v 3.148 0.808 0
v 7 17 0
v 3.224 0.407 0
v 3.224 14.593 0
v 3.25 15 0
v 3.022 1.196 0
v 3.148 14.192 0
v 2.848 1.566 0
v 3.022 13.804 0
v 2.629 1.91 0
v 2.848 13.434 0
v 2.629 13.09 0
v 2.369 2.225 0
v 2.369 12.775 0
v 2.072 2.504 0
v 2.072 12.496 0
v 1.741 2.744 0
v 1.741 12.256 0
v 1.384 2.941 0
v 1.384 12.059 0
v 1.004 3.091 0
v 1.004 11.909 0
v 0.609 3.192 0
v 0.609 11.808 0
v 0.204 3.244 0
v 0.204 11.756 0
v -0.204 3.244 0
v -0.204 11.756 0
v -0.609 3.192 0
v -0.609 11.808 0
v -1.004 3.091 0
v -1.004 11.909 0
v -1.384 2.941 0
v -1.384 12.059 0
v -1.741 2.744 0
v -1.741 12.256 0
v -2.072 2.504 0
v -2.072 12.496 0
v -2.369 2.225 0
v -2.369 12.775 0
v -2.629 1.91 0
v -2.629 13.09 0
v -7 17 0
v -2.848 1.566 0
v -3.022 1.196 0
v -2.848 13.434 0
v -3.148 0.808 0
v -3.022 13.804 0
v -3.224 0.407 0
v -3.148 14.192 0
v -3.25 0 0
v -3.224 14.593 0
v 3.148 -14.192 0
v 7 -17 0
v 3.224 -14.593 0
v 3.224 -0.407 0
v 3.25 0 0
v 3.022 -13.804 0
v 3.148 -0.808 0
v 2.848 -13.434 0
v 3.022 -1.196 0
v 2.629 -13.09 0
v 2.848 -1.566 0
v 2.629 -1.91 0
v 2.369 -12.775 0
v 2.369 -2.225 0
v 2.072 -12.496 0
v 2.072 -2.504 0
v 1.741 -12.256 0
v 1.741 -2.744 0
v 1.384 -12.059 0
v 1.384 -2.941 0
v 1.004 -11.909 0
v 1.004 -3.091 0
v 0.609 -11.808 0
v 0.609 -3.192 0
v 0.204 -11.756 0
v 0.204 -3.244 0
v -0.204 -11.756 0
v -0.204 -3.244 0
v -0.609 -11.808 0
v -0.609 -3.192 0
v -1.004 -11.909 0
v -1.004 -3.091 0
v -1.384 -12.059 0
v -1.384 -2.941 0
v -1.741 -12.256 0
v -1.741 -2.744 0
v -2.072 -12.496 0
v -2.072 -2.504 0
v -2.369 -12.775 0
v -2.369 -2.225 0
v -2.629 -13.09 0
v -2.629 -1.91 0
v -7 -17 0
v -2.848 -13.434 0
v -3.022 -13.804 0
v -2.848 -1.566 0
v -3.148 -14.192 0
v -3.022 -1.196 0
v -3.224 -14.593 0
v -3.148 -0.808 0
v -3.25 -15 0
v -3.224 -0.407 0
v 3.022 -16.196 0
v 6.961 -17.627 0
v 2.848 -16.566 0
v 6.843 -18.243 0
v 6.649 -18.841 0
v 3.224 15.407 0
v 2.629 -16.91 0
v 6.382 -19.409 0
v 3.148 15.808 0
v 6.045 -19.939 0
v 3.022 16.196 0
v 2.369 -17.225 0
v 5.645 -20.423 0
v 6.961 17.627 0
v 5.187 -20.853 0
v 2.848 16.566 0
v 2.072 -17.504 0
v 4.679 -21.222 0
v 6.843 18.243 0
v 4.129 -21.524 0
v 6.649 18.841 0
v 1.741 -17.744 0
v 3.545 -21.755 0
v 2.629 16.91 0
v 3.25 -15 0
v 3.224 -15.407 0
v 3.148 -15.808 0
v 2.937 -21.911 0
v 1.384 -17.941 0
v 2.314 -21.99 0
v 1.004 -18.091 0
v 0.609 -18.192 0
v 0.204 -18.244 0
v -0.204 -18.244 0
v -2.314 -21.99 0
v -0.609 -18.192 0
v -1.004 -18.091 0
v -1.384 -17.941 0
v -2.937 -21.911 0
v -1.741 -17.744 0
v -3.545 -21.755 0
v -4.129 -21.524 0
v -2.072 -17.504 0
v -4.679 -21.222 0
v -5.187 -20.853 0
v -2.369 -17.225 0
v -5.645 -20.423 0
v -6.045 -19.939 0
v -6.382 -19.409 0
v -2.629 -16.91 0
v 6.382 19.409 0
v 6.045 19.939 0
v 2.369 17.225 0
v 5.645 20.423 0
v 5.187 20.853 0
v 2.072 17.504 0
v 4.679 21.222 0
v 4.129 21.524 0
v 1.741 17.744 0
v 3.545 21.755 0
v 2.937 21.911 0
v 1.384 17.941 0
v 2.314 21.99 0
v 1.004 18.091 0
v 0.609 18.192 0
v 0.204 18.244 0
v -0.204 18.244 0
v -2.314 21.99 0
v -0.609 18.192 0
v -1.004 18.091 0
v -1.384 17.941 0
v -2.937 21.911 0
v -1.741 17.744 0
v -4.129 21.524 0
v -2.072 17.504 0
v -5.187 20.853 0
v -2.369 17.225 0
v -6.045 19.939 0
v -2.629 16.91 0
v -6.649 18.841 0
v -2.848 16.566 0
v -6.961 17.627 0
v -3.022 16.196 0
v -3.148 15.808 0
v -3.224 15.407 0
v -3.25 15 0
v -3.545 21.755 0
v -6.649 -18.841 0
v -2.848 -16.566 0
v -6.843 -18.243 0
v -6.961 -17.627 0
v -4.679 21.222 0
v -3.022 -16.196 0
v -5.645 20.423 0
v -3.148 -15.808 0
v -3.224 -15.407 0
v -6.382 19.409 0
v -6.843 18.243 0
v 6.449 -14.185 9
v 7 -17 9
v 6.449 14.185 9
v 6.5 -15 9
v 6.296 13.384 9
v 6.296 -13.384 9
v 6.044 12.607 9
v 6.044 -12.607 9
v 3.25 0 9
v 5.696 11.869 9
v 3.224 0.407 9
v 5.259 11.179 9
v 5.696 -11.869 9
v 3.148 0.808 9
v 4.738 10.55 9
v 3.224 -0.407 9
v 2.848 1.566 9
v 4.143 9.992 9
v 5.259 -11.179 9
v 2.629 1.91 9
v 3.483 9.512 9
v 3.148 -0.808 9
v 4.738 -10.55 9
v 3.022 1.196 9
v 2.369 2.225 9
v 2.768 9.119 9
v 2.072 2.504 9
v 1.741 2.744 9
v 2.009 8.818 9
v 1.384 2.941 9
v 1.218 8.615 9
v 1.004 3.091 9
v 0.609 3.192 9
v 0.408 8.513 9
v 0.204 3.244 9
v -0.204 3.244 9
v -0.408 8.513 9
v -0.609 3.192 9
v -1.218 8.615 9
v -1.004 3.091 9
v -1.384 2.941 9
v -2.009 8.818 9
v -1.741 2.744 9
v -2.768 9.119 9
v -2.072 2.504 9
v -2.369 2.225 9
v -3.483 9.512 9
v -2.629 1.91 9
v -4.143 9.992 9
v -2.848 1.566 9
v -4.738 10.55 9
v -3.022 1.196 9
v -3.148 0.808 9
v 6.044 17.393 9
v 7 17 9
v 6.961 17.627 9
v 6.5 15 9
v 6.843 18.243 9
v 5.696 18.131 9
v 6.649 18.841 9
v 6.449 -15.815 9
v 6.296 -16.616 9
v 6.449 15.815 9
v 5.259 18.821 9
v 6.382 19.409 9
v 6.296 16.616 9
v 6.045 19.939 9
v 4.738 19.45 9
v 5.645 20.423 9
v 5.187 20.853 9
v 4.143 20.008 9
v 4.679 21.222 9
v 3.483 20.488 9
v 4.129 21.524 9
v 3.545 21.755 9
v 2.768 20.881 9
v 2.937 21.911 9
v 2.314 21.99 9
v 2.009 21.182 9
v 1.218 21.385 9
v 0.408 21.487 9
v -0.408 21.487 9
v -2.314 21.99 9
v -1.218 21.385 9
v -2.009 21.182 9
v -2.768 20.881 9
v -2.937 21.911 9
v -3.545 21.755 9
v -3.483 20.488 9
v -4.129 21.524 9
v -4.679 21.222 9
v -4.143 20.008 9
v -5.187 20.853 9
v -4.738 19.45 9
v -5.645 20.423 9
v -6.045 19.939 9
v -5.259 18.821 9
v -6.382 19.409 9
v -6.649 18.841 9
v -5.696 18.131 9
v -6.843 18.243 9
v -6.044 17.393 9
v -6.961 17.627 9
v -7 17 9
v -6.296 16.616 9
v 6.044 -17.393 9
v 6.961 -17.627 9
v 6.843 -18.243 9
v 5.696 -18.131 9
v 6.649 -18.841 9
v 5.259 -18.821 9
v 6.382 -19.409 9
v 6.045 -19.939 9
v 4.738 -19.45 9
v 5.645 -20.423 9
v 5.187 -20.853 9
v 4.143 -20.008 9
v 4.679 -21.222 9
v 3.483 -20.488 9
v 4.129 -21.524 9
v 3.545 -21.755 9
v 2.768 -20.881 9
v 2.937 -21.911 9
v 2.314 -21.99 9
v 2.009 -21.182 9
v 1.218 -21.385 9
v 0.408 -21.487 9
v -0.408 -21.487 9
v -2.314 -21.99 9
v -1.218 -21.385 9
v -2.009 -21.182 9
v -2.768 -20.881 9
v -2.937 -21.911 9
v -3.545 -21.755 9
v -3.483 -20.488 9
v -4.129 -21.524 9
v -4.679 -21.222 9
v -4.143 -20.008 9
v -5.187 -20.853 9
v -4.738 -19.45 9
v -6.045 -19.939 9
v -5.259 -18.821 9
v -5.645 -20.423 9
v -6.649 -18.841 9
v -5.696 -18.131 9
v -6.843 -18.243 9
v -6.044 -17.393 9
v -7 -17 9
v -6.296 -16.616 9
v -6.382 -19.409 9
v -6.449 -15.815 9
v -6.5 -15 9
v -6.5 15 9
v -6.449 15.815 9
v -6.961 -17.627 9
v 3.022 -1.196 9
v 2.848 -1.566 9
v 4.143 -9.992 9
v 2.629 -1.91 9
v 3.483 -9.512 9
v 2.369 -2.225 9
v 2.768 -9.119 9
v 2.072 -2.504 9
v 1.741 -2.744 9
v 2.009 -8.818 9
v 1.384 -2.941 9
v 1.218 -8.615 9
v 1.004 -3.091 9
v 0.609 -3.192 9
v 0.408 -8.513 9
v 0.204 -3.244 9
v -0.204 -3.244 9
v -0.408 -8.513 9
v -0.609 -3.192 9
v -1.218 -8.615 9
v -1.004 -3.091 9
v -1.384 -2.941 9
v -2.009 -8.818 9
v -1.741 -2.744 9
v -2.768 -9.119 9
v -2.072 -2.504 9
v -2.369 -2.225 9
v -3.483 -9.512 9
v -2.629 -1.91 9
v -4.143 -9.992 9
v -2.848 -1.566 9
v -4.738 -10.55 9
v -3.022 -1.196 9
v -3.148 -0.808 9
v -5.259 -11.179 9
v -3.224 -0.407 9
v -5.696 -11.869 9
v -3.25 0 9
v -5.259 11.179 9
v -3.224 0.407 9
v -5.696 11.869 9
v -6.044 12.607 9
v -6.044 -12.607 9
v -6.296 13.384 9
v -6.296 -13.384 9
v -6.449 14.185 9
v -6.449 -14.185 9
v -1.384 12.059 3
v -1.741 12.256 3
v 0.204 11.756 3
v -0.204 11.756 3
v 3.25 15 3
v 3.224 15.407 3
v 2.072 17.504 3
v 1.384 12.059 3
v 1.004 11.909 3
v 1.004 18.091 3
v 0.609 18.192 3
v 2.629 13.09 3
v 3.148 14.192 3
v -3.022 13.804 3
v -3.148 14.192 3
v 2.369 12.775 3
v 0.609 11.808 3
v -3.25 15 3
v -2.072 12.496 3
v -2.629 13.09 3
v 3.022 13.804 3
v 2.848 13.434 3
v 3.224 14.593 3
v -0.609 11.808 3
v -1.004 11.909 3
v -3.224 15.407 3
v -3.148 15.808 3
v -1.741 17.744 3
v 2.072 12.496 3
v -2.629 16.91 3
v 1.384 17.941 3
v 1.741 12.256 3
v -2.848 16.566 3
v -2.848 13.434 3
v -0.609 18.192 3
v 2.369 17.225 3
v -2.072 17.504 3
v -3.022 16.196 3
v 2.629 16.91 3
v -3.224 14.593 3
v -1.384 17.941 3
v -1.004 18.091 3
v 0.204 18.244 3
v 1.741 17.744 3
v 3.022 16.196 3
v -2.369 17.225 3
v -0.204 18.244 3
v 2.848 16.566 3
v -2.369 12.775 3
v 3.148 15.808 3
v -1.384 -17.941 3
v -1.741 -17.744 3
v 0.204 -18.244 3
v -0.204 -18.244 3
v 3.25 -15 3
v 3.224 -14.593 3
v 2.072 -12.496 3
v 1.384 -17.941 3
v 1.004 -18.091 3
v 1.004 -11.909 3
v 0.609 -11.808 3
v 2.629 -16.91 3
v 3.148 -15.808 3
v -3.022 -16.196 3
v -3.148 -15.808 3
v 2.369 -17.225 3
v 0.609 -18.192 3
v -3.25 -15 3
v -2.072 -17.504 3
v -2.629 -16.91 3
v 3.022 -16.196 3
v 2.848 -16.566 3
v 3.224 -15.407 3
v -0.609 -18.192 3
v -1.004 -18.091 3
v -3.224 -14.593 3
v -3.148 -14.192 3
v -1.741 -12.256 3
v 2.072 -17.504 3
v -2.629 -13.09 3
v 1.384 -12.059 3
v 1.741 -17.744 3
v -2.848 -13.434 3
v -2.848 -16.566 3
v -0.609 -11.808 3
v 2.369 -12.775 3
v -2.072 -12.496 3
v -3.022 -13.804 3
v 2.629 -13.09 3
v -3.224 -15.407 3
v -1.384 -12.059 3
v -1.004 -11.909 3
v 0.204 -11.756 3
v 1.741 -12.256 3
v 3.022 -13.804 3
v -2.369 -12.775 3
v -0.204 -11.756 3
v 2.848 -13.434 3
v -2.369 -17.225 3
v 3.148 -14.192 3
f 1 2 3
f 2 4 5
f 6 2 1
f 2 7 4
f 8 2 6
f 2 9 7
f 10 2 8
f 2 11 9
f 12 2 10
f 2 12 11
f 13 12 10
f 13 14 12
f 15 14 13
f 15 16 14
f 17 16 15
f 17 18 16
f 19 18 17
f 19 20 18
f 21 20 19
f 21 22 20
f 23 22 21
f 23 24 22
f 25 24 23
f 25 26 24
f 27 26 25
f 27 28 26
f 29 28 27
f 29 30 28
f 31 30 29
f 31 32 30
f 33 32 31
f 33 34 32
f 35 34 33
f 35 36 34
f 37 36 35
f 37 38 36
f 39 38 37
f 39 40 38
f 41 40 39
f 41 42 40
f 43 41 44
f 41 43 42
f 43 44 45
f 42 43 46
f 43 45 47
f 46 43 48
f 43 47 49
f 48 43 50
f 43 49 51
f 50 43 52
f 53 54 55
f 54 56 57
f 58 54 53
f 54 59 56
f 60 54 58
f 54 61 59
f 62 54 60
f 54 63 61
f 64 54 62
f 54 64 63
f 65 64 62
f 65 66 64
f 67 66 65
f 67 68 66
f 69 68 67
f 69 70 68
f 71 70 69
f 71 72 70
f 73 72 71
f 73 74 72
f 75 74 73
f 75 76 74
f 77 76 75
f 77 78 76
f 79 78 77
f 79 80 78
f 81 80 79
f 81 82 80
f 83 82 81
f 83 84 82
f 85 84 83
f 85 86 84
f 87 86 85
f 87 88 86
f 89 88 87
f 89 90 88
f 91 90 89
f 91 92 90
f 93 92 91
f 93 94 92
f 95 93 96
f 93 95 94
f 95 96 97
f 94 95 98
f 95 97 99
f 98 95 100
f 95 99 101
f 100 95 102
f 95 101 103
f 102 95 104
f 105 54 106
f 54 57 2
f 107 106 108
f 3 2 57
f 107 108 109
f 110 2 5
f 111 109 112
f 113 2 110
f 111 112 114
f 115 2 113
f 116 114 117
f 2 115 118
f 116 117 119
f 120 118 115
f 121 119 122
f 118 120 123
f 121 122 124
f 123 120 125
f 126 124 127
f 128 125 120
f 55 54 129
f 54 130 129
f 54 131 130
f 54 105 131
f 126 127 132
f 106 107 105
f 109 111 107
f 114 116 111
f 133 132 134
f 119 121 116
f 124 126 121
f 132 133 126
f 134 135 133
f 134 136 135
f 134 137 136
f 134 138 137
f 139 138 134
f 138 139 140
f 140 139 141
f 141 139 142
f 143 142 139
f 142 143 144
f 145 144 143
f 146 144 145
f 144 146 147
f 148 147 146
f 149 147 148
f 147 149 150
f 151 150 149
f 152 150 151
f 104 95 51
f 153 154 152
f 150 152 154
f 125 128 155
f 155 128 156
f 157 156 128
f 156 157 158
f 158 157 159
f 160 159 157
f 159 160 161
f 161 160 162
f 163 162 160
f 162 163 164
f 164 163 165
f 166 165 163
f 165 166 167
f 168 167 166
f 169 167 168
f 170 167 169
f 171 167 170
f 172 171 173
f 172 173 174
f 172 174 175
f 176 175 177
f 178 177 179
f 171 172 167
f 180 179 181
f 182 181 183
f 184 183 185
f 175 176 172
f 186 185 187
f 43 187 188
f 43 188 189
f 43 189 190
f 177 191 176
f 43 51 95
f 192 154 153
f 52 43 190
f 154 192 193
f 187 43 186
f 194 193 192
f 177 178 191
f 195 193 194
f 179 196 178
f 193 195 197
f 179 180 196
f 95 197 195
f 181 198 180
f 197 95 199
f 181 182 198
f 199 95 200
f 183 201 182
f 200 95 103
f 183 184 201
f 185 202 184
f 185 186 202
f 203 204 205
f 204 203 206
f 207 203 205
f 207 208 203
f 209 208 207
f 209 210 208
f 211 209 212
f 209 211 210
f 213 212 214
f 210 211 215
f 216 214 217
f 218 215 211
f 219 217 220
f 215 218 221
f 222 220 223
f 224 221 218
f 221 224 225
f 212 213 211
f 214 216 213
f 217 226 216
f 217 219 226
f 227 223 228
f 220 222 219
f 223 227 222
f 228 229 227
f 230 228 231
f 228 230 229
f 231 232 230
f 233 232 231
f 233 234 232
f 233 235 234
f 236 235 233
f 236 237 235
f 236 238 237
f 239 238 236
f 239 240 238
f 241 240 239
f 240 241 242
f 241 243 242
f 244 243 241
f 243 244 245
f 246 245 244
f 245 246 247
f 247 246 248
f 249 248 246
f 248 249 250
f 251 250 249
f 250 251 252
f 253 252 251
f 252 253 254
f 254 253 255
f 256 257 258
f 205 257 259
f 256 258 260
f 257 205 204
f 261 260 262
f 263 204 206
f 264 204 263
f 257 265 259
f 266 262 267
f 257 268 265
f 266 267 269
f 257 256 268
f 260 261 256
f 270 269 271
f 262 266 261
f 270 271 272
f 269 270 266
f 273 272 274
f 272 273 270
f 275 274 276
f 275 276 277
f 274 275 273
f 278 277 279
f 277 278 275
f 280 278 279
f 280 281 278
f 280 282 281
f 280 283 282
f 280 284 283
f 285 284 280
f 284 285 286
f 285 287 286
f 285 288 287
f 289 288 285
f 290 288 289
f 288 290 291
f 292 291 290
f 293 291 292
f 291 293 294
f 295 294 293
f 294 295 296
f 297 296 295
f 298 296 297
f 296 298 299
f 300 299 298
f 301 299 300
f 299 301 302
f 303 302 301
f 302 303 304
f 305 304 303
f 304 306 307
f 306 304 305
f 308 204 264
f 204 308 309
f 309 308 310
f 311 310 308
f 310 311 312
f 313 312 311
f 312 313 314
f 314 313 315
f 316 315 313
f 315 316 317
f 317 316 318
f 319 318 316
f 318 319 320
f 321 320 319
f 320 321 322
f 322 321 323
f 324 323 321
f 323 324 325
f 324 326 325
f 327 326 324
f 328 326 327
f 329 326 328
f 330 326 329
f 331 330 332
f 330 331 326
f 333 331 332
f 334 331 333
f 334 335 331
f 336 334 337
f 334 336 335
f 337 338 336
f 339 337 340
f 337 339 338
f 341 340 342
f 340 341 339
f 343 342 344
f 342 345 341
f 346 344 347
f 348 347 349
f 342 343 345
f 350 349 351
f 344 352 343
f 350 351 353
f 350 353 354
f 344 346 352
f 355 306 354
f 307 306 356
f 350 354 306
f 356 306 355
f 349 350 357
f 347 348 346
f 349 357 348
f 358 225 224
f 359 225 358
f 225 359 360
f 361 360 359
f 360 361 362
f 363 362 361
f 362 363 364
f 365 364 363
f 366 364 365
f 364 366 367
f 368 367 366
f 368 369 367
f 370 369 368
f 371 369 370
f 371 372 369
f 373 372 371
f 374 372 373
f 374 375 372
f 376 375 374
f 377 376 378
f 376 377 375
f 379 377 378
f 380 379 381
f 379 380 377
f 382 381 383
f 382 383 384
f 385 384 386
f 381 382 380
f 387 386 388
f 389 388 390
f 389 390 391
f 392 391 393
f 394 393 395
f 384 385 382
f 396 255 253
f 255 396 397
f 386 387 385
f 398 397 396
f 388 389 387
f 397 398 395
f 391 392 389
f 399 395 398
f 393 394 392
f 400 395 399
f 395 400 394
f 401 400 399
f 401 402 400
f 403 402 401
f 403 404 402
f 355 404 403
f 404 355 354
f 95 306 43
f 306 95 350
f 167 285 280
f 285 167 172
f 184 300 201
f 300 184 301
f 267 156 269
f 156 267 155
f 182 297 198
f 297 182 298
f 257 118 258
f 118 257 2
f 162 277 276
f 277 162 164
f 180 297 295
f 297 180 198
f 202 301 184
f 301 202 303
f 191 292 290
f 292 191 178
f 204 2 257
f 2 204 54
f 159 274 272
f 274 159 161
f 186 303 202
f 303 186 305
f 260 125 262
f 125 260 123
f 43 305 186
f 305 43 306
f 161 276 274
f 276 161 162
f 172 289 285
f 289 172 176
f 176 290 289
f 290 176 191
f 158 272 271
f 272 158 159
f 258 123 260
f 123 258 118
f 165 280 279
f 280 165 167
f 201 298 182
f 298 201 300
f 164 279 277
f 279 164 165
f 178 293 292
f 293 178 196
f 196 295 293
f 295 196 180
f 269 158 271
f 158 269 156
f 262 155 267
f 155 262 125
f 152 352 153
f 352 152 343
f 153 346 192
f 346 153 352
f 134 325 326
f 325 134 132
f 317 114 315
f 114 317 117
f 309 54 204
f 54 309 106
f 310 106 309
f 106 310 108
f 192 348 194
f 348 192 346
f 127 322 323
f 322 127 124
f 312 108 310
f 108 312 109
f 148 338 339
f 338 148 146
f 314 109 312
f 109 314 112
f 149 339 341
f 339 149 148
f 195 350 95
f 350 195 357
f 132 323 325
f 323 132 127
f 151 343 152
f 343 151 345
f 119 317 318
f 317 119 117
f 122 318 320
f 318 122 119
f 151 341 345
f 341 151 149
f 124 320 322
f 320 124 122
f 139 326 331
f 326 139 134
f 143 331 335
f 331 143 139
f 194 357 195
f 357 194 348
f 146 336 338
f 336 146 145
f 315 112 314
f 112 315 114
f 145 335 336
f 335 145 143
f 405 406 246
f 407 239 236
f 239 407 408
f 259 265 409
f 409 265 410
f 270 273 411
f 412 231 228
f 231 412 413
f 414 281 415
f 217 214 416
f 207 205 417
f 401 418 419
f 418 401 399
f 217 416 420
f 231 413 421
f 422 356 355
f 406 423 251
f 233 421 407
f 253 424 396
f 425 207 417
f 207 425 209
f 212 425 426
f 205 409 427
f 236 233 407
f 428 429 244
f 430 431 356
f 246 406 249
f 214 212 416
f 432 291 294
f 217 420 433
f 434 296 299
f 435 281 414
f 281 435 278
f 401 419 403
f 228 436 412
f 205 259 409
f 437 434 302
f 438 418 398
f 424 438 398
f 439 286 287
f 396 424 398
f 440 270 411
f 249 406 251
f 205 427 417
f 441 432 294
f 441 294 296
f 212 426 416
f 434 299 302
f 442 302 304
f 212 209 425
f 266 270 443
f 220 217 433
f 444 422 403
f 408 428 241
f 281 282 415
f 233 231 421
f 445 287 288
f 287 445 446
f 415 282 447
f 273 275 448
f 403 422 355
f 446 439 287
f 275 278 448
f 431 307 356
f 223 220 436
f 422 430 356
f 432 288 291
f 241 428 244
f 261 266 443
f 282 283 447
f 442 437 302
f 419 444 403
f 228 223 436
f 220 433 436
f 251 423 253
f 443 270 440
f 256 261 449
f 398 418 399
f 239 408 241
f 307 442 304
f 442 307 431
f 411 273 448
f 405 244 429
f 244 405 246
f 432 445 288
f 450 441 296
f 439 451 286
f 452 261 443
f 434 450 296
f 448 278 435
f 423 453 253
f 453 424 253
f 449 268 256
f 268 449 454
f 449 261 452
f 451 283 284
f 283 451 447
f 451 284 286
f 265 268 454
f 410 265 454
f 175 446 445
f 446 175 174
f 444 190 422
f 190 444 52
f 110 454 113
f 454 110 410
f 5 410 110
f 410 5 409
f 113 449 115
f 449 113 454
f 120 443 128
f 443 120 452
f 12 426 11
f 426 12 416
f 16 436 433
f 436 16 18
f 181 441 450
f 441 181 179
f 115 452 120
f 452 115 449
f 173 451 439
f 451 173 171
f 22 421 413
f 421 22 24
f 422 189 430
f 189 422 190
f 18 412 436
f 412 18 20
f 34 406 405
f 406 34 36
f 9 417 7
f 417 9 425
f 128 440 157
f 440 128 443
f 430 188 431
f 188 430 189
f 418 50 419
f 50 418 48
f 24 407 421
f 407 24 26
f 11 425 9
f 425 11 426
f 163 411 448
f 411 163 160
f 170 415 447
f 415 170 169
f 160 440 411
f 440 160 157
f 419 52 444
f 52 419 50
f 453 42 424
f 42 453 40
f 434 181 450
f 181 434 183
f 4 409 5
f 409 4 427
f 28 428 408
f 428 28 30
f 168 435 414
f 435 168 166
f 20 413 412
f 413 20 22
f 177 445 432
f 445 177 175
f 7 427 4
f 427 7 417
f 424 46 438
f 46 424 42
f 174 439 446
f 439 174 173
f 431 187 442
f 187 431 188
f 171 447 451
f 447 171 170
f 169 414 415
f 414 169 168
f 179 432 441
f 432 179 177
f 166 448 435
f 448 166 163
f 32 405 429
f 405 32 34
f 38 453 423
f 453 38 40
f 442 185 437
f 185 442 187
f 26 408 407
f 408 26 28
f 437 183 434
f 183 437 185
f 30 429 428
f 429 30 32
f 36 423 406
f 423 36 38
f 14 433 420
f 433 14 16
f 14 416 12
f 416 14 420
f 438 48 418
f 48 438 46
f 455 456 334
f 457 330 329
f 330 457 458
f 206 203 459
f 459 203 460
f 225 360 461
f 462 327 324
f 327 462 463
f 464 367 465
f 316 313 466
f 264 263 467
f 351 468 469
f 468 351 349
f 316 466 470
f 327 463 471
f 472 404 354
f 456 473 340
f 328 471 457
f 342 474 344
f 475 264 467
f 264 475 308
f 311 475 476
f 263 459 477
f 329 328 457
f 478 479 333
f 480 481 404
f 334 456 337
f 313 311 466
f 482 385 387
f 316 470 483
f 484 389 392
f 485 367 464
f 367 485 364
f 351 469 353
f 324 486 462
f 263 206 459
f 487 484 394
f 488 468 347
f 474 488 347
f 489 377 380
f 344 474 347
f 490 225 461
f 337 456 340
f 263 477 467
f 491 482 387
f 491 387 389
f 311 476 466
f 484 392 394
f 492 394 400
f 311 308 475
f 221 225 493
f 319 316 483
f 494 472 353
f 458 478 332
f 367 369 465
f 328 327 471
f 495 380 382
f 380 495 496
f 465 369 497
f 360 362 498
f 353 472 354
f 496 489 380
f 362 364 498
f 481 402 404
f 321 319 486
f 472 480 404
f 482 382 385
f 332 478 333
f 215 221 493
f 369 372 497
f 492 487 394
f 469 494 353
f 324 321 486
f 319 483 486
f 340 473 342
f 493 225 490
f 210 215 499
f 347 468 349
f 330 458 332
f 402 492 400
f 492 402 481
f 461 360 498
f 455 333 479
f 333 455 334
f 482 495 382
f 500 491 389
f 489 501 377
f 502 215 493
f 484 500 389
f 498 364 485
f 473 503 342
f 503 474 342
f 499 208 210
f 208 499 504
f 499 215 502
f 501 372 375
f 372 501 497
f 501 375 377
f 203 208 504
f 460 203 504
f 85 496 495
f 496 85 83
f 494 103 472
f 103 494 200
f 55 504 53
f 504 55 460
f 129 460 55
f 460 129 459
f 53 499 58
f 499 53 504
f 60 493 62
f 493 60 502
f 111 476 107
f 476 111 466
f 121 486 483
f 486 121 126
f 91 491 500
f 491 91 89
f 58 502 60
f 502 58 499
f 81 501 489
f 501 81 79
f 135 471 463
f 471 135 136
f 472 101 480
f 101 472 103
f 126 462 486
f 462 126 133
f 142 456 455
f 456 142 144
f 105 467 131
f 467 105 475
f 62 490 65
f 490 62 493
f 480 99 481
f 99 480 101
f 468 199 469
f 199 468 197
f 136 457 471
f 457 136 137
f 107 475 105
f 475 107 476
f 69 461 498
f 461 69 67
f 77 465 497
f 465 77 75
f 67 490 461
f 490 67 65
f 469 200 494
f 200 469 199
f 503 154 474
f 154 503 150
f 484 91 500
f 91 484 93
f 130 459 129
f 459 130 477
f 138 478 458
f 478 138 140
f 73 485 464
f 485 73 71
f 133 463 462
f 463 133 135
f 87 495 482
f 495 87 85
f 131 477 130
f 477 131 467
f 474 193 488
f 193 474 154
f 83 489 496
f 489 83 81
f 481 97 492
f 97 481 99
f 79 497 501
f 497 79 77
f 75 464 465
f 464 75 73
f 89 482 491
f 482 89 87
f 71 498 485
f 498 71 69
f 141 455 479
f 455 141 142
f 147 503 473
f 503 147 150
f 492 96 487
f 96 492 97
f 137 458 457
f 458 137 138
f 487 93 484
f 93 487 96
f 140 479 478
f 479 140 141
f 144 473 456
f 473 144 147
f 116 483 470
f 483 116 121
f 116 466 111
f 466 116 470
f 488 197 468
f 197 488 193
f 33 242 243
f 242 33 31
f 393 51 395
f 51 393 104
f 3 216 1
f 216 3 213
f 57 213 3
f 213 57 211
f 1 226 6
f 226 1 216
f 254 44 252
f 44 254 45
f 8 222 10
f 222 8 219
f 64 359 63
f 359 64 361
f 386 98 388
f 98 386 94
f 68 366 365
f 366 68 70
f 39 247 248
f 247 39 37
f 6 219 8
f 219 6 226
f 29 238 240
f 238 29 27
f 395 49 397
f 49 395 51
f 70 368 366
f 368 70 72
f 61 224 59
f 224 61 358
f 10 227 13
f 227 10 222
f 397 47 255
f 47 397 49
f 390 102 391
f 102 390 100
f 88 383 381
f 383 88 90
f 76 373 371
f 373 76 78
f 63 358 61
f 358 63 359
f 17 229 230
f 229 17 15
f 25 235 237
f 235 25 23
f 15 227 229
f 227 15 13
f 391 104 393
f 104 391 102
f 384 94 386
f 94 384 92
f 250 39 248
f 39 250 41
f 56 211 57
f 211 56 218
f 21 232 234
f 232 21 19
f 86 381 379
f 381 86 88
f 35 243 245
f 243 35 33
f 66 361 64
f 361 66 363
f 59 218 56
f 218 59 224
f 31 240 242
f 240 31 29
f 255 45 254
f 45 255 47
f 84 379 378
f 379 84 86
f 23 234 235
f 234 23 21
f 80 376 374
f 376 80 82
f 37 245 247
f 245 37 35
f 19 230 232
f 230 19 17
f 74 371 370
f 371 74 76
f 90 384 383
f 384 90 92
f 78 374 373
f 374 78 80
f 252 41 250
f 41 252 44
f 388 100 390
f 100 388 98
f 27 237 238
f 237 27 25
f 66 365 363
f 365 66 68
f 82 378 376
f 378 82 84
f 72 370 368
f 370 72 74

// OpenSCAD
$fn = 50;


difference() {
	union() {
		cylinder(h = 9, r = 7.0000000000);
		translate(v = [0.0000000000, 7.5000000000, 0]) {
			hull() {
				translate(v = [-2.0000000000, 9.5000000000, 0]) {
					cylinder(h = 9, r = 5);
				}
				translate(v = [2.0000000000, 9.5000000000, 0]) {
					cylinder(h = 9, r = 5);
				}
				translate(v = [-2.0000000000, -9.5000000000, 0]) {
					cylinder(h = 9, r = 5);
				}
				translate(v = [2.0000000000, -9.5000000000, 0]) {
					cylinder(h = 9, r = 5);
				}
			}
		}
		translate(v = [0.0000000000, 7.5000000000, 0]) {
			hull() {
				translate(v = [-2.0000000000, 9.5000000000, 0]) {
					cylinder(h = 9, r = 5);
				}
				translate(v = [2.0000000000, 9.5000000000, 0]) {
					cylinder(h = 9, r = 5);
				}
				translate(v = [-2.0000000000, -9.5000000000, 0]) {
					cylinder(h = 9, r = 5);
				}
				translate(v = [2.0000000000, -9.5000000000, 0]) {
					cylinder(h = 9, r = 5);
				}
			}
		}
		translate(v = [0.0000000000, -7.5000000000, 0]) {
			hull() {
				translate(v = [-2.0000000000, 9.5000000000, 0]) {
					cylinder(h = 9, r = 5);
				}
				translate(v = [2.0000000000, 9.5000000000, 0]) {
					cylinder(h = 9, r = 5);
				}
				translate(v = [-2.0000000000, -9.5000000000, 0]) {
					cylinder(h = 9, r = 5);
				}
				translate(v = [2.0000000000, -9.5000000000, 0]) {
					cylinder(h = 9, r = 5);
				}
			}
		}
		translate(v = [0.0000000000, -7.5000000000, 0]) {
			hull() {
				translate(v = [-2.0000000000, 9.5000000000, 0]) {
					cylinder(h = 9, r = 5);
				}
				translate(v = [2.0000000000, 9.5000000000, 0]) {
					cylinder(h = 9, r = 5);
				}
				translate(v = [-2.0000000000, -9.5000000000, 0]) {
					cylinder(h = 9, r = 5);
				}
				translate(v = [2.0000000000, -9.5000000000, 0]) {
					cylinder(h = 9, r = 5);
				}
			}
		}
	}
	union() {
		translate(v = [0.0000000000, 15.0000000000, 9]) {
			rotate(a = [0, 0, 0]) {
				difference() {
					union() {
						#translate(v = [0, 0, -9.0000000000]) {
							cylinder(h = 9, r = 2.2500000000);
						}
						#translate(v = [0, 0, -6]) {
							cylinder(h = 6, r1 = 3.2500000000, r2 = 6.5000000000);
						}
						#translate(v = [0, 0, -9.0000000000]) {
							cylinder(h = 9, r = 3.2500000000);
						}
						#translate(v = [0, 0, -9.0000000000]) {
							cylinder(h = 9, r = 2.2500000000);
						}
					}
					union();
				}
			}
		}
		translate(v = [0.0000000000, 15.0000000000, 9]) {
			rotate(a = [0, 0, 0]) {
				difference() {
					union() {
						#translate(v = [0, 0, -9.0000000000]) {
							cylinder(h = 9, r = 2.2500000000);
						}
						#translate(v = [0, 0, -6]) {
							cylinder(h = 6, r1 = 3.2500000000, r2 = 6.5000000000);
						}
						#translate(v = [0, 0, -9.0000000000]) {
							cylinder(h = 9, r = 3.2500000000);
						}
						#translate(v = [0, 0, -9.0000000000]) {
							cylinder(h = 9, r = 2.2500000000);
						}
					}
					union();
				}
			}
		}
		translate(v = [0.0000000000, -15.0000000000, 9]) {
			rotate(a = [0, 0, 0]) {
				difference() {
					union() {
						#translate(v = [0, 0, -9.0000000000]) {
							cylinder(h = 9, r = 2.2500000000);
						}
						#translate(v = [0, 0, -6]) {
							cylinder(h = 6, r1 = 3.2500000000, r2 = 6.5000000000);
						}
						#translate(v = [0, 0, -9.0000000000]) {
							cylinder(h = 9, r = 3.2500000000);
						}
						#translate(v = [0, 0, -9.0000000000]) {
							cylinder(h = 9, r = 2.2500000000);
						}
					}
					union();
				}
			}
		}
		translate(v = [0.0000000000, -15.0000000000, 9]) {
			rotate(a = [0, 0, 0]) {
				difference() {
					union() {
						#translate(v = [0, 0, -9.0000000000]) {
							cylinder(h = 9, r = 2.2500000000);
						}
						#translate(v = [0, 0, -6]) {
							cylinder(h = 6, r1 = 3.2500000000, r2 = 6.5000000000);
						}
						#translate(v = [0, 0, -9.0000000000]) {
							cylinder(h = 9, r = 3.2500000000);
						}
						#translate(v = [0, 0, -9.0000000000]) {
							cylinder(h = 9, r = 2.2500000000);
						}
					}
					union();
				}
			}
		}
		translate(v = [0, 0, -100]) {
			cylinder(h = 200, r = 3.2500000000);
		}
		translate(v = [0, 0, -100]) {
			cylinder(h = 200, r = 1.8000000000);
		}
	}
}
